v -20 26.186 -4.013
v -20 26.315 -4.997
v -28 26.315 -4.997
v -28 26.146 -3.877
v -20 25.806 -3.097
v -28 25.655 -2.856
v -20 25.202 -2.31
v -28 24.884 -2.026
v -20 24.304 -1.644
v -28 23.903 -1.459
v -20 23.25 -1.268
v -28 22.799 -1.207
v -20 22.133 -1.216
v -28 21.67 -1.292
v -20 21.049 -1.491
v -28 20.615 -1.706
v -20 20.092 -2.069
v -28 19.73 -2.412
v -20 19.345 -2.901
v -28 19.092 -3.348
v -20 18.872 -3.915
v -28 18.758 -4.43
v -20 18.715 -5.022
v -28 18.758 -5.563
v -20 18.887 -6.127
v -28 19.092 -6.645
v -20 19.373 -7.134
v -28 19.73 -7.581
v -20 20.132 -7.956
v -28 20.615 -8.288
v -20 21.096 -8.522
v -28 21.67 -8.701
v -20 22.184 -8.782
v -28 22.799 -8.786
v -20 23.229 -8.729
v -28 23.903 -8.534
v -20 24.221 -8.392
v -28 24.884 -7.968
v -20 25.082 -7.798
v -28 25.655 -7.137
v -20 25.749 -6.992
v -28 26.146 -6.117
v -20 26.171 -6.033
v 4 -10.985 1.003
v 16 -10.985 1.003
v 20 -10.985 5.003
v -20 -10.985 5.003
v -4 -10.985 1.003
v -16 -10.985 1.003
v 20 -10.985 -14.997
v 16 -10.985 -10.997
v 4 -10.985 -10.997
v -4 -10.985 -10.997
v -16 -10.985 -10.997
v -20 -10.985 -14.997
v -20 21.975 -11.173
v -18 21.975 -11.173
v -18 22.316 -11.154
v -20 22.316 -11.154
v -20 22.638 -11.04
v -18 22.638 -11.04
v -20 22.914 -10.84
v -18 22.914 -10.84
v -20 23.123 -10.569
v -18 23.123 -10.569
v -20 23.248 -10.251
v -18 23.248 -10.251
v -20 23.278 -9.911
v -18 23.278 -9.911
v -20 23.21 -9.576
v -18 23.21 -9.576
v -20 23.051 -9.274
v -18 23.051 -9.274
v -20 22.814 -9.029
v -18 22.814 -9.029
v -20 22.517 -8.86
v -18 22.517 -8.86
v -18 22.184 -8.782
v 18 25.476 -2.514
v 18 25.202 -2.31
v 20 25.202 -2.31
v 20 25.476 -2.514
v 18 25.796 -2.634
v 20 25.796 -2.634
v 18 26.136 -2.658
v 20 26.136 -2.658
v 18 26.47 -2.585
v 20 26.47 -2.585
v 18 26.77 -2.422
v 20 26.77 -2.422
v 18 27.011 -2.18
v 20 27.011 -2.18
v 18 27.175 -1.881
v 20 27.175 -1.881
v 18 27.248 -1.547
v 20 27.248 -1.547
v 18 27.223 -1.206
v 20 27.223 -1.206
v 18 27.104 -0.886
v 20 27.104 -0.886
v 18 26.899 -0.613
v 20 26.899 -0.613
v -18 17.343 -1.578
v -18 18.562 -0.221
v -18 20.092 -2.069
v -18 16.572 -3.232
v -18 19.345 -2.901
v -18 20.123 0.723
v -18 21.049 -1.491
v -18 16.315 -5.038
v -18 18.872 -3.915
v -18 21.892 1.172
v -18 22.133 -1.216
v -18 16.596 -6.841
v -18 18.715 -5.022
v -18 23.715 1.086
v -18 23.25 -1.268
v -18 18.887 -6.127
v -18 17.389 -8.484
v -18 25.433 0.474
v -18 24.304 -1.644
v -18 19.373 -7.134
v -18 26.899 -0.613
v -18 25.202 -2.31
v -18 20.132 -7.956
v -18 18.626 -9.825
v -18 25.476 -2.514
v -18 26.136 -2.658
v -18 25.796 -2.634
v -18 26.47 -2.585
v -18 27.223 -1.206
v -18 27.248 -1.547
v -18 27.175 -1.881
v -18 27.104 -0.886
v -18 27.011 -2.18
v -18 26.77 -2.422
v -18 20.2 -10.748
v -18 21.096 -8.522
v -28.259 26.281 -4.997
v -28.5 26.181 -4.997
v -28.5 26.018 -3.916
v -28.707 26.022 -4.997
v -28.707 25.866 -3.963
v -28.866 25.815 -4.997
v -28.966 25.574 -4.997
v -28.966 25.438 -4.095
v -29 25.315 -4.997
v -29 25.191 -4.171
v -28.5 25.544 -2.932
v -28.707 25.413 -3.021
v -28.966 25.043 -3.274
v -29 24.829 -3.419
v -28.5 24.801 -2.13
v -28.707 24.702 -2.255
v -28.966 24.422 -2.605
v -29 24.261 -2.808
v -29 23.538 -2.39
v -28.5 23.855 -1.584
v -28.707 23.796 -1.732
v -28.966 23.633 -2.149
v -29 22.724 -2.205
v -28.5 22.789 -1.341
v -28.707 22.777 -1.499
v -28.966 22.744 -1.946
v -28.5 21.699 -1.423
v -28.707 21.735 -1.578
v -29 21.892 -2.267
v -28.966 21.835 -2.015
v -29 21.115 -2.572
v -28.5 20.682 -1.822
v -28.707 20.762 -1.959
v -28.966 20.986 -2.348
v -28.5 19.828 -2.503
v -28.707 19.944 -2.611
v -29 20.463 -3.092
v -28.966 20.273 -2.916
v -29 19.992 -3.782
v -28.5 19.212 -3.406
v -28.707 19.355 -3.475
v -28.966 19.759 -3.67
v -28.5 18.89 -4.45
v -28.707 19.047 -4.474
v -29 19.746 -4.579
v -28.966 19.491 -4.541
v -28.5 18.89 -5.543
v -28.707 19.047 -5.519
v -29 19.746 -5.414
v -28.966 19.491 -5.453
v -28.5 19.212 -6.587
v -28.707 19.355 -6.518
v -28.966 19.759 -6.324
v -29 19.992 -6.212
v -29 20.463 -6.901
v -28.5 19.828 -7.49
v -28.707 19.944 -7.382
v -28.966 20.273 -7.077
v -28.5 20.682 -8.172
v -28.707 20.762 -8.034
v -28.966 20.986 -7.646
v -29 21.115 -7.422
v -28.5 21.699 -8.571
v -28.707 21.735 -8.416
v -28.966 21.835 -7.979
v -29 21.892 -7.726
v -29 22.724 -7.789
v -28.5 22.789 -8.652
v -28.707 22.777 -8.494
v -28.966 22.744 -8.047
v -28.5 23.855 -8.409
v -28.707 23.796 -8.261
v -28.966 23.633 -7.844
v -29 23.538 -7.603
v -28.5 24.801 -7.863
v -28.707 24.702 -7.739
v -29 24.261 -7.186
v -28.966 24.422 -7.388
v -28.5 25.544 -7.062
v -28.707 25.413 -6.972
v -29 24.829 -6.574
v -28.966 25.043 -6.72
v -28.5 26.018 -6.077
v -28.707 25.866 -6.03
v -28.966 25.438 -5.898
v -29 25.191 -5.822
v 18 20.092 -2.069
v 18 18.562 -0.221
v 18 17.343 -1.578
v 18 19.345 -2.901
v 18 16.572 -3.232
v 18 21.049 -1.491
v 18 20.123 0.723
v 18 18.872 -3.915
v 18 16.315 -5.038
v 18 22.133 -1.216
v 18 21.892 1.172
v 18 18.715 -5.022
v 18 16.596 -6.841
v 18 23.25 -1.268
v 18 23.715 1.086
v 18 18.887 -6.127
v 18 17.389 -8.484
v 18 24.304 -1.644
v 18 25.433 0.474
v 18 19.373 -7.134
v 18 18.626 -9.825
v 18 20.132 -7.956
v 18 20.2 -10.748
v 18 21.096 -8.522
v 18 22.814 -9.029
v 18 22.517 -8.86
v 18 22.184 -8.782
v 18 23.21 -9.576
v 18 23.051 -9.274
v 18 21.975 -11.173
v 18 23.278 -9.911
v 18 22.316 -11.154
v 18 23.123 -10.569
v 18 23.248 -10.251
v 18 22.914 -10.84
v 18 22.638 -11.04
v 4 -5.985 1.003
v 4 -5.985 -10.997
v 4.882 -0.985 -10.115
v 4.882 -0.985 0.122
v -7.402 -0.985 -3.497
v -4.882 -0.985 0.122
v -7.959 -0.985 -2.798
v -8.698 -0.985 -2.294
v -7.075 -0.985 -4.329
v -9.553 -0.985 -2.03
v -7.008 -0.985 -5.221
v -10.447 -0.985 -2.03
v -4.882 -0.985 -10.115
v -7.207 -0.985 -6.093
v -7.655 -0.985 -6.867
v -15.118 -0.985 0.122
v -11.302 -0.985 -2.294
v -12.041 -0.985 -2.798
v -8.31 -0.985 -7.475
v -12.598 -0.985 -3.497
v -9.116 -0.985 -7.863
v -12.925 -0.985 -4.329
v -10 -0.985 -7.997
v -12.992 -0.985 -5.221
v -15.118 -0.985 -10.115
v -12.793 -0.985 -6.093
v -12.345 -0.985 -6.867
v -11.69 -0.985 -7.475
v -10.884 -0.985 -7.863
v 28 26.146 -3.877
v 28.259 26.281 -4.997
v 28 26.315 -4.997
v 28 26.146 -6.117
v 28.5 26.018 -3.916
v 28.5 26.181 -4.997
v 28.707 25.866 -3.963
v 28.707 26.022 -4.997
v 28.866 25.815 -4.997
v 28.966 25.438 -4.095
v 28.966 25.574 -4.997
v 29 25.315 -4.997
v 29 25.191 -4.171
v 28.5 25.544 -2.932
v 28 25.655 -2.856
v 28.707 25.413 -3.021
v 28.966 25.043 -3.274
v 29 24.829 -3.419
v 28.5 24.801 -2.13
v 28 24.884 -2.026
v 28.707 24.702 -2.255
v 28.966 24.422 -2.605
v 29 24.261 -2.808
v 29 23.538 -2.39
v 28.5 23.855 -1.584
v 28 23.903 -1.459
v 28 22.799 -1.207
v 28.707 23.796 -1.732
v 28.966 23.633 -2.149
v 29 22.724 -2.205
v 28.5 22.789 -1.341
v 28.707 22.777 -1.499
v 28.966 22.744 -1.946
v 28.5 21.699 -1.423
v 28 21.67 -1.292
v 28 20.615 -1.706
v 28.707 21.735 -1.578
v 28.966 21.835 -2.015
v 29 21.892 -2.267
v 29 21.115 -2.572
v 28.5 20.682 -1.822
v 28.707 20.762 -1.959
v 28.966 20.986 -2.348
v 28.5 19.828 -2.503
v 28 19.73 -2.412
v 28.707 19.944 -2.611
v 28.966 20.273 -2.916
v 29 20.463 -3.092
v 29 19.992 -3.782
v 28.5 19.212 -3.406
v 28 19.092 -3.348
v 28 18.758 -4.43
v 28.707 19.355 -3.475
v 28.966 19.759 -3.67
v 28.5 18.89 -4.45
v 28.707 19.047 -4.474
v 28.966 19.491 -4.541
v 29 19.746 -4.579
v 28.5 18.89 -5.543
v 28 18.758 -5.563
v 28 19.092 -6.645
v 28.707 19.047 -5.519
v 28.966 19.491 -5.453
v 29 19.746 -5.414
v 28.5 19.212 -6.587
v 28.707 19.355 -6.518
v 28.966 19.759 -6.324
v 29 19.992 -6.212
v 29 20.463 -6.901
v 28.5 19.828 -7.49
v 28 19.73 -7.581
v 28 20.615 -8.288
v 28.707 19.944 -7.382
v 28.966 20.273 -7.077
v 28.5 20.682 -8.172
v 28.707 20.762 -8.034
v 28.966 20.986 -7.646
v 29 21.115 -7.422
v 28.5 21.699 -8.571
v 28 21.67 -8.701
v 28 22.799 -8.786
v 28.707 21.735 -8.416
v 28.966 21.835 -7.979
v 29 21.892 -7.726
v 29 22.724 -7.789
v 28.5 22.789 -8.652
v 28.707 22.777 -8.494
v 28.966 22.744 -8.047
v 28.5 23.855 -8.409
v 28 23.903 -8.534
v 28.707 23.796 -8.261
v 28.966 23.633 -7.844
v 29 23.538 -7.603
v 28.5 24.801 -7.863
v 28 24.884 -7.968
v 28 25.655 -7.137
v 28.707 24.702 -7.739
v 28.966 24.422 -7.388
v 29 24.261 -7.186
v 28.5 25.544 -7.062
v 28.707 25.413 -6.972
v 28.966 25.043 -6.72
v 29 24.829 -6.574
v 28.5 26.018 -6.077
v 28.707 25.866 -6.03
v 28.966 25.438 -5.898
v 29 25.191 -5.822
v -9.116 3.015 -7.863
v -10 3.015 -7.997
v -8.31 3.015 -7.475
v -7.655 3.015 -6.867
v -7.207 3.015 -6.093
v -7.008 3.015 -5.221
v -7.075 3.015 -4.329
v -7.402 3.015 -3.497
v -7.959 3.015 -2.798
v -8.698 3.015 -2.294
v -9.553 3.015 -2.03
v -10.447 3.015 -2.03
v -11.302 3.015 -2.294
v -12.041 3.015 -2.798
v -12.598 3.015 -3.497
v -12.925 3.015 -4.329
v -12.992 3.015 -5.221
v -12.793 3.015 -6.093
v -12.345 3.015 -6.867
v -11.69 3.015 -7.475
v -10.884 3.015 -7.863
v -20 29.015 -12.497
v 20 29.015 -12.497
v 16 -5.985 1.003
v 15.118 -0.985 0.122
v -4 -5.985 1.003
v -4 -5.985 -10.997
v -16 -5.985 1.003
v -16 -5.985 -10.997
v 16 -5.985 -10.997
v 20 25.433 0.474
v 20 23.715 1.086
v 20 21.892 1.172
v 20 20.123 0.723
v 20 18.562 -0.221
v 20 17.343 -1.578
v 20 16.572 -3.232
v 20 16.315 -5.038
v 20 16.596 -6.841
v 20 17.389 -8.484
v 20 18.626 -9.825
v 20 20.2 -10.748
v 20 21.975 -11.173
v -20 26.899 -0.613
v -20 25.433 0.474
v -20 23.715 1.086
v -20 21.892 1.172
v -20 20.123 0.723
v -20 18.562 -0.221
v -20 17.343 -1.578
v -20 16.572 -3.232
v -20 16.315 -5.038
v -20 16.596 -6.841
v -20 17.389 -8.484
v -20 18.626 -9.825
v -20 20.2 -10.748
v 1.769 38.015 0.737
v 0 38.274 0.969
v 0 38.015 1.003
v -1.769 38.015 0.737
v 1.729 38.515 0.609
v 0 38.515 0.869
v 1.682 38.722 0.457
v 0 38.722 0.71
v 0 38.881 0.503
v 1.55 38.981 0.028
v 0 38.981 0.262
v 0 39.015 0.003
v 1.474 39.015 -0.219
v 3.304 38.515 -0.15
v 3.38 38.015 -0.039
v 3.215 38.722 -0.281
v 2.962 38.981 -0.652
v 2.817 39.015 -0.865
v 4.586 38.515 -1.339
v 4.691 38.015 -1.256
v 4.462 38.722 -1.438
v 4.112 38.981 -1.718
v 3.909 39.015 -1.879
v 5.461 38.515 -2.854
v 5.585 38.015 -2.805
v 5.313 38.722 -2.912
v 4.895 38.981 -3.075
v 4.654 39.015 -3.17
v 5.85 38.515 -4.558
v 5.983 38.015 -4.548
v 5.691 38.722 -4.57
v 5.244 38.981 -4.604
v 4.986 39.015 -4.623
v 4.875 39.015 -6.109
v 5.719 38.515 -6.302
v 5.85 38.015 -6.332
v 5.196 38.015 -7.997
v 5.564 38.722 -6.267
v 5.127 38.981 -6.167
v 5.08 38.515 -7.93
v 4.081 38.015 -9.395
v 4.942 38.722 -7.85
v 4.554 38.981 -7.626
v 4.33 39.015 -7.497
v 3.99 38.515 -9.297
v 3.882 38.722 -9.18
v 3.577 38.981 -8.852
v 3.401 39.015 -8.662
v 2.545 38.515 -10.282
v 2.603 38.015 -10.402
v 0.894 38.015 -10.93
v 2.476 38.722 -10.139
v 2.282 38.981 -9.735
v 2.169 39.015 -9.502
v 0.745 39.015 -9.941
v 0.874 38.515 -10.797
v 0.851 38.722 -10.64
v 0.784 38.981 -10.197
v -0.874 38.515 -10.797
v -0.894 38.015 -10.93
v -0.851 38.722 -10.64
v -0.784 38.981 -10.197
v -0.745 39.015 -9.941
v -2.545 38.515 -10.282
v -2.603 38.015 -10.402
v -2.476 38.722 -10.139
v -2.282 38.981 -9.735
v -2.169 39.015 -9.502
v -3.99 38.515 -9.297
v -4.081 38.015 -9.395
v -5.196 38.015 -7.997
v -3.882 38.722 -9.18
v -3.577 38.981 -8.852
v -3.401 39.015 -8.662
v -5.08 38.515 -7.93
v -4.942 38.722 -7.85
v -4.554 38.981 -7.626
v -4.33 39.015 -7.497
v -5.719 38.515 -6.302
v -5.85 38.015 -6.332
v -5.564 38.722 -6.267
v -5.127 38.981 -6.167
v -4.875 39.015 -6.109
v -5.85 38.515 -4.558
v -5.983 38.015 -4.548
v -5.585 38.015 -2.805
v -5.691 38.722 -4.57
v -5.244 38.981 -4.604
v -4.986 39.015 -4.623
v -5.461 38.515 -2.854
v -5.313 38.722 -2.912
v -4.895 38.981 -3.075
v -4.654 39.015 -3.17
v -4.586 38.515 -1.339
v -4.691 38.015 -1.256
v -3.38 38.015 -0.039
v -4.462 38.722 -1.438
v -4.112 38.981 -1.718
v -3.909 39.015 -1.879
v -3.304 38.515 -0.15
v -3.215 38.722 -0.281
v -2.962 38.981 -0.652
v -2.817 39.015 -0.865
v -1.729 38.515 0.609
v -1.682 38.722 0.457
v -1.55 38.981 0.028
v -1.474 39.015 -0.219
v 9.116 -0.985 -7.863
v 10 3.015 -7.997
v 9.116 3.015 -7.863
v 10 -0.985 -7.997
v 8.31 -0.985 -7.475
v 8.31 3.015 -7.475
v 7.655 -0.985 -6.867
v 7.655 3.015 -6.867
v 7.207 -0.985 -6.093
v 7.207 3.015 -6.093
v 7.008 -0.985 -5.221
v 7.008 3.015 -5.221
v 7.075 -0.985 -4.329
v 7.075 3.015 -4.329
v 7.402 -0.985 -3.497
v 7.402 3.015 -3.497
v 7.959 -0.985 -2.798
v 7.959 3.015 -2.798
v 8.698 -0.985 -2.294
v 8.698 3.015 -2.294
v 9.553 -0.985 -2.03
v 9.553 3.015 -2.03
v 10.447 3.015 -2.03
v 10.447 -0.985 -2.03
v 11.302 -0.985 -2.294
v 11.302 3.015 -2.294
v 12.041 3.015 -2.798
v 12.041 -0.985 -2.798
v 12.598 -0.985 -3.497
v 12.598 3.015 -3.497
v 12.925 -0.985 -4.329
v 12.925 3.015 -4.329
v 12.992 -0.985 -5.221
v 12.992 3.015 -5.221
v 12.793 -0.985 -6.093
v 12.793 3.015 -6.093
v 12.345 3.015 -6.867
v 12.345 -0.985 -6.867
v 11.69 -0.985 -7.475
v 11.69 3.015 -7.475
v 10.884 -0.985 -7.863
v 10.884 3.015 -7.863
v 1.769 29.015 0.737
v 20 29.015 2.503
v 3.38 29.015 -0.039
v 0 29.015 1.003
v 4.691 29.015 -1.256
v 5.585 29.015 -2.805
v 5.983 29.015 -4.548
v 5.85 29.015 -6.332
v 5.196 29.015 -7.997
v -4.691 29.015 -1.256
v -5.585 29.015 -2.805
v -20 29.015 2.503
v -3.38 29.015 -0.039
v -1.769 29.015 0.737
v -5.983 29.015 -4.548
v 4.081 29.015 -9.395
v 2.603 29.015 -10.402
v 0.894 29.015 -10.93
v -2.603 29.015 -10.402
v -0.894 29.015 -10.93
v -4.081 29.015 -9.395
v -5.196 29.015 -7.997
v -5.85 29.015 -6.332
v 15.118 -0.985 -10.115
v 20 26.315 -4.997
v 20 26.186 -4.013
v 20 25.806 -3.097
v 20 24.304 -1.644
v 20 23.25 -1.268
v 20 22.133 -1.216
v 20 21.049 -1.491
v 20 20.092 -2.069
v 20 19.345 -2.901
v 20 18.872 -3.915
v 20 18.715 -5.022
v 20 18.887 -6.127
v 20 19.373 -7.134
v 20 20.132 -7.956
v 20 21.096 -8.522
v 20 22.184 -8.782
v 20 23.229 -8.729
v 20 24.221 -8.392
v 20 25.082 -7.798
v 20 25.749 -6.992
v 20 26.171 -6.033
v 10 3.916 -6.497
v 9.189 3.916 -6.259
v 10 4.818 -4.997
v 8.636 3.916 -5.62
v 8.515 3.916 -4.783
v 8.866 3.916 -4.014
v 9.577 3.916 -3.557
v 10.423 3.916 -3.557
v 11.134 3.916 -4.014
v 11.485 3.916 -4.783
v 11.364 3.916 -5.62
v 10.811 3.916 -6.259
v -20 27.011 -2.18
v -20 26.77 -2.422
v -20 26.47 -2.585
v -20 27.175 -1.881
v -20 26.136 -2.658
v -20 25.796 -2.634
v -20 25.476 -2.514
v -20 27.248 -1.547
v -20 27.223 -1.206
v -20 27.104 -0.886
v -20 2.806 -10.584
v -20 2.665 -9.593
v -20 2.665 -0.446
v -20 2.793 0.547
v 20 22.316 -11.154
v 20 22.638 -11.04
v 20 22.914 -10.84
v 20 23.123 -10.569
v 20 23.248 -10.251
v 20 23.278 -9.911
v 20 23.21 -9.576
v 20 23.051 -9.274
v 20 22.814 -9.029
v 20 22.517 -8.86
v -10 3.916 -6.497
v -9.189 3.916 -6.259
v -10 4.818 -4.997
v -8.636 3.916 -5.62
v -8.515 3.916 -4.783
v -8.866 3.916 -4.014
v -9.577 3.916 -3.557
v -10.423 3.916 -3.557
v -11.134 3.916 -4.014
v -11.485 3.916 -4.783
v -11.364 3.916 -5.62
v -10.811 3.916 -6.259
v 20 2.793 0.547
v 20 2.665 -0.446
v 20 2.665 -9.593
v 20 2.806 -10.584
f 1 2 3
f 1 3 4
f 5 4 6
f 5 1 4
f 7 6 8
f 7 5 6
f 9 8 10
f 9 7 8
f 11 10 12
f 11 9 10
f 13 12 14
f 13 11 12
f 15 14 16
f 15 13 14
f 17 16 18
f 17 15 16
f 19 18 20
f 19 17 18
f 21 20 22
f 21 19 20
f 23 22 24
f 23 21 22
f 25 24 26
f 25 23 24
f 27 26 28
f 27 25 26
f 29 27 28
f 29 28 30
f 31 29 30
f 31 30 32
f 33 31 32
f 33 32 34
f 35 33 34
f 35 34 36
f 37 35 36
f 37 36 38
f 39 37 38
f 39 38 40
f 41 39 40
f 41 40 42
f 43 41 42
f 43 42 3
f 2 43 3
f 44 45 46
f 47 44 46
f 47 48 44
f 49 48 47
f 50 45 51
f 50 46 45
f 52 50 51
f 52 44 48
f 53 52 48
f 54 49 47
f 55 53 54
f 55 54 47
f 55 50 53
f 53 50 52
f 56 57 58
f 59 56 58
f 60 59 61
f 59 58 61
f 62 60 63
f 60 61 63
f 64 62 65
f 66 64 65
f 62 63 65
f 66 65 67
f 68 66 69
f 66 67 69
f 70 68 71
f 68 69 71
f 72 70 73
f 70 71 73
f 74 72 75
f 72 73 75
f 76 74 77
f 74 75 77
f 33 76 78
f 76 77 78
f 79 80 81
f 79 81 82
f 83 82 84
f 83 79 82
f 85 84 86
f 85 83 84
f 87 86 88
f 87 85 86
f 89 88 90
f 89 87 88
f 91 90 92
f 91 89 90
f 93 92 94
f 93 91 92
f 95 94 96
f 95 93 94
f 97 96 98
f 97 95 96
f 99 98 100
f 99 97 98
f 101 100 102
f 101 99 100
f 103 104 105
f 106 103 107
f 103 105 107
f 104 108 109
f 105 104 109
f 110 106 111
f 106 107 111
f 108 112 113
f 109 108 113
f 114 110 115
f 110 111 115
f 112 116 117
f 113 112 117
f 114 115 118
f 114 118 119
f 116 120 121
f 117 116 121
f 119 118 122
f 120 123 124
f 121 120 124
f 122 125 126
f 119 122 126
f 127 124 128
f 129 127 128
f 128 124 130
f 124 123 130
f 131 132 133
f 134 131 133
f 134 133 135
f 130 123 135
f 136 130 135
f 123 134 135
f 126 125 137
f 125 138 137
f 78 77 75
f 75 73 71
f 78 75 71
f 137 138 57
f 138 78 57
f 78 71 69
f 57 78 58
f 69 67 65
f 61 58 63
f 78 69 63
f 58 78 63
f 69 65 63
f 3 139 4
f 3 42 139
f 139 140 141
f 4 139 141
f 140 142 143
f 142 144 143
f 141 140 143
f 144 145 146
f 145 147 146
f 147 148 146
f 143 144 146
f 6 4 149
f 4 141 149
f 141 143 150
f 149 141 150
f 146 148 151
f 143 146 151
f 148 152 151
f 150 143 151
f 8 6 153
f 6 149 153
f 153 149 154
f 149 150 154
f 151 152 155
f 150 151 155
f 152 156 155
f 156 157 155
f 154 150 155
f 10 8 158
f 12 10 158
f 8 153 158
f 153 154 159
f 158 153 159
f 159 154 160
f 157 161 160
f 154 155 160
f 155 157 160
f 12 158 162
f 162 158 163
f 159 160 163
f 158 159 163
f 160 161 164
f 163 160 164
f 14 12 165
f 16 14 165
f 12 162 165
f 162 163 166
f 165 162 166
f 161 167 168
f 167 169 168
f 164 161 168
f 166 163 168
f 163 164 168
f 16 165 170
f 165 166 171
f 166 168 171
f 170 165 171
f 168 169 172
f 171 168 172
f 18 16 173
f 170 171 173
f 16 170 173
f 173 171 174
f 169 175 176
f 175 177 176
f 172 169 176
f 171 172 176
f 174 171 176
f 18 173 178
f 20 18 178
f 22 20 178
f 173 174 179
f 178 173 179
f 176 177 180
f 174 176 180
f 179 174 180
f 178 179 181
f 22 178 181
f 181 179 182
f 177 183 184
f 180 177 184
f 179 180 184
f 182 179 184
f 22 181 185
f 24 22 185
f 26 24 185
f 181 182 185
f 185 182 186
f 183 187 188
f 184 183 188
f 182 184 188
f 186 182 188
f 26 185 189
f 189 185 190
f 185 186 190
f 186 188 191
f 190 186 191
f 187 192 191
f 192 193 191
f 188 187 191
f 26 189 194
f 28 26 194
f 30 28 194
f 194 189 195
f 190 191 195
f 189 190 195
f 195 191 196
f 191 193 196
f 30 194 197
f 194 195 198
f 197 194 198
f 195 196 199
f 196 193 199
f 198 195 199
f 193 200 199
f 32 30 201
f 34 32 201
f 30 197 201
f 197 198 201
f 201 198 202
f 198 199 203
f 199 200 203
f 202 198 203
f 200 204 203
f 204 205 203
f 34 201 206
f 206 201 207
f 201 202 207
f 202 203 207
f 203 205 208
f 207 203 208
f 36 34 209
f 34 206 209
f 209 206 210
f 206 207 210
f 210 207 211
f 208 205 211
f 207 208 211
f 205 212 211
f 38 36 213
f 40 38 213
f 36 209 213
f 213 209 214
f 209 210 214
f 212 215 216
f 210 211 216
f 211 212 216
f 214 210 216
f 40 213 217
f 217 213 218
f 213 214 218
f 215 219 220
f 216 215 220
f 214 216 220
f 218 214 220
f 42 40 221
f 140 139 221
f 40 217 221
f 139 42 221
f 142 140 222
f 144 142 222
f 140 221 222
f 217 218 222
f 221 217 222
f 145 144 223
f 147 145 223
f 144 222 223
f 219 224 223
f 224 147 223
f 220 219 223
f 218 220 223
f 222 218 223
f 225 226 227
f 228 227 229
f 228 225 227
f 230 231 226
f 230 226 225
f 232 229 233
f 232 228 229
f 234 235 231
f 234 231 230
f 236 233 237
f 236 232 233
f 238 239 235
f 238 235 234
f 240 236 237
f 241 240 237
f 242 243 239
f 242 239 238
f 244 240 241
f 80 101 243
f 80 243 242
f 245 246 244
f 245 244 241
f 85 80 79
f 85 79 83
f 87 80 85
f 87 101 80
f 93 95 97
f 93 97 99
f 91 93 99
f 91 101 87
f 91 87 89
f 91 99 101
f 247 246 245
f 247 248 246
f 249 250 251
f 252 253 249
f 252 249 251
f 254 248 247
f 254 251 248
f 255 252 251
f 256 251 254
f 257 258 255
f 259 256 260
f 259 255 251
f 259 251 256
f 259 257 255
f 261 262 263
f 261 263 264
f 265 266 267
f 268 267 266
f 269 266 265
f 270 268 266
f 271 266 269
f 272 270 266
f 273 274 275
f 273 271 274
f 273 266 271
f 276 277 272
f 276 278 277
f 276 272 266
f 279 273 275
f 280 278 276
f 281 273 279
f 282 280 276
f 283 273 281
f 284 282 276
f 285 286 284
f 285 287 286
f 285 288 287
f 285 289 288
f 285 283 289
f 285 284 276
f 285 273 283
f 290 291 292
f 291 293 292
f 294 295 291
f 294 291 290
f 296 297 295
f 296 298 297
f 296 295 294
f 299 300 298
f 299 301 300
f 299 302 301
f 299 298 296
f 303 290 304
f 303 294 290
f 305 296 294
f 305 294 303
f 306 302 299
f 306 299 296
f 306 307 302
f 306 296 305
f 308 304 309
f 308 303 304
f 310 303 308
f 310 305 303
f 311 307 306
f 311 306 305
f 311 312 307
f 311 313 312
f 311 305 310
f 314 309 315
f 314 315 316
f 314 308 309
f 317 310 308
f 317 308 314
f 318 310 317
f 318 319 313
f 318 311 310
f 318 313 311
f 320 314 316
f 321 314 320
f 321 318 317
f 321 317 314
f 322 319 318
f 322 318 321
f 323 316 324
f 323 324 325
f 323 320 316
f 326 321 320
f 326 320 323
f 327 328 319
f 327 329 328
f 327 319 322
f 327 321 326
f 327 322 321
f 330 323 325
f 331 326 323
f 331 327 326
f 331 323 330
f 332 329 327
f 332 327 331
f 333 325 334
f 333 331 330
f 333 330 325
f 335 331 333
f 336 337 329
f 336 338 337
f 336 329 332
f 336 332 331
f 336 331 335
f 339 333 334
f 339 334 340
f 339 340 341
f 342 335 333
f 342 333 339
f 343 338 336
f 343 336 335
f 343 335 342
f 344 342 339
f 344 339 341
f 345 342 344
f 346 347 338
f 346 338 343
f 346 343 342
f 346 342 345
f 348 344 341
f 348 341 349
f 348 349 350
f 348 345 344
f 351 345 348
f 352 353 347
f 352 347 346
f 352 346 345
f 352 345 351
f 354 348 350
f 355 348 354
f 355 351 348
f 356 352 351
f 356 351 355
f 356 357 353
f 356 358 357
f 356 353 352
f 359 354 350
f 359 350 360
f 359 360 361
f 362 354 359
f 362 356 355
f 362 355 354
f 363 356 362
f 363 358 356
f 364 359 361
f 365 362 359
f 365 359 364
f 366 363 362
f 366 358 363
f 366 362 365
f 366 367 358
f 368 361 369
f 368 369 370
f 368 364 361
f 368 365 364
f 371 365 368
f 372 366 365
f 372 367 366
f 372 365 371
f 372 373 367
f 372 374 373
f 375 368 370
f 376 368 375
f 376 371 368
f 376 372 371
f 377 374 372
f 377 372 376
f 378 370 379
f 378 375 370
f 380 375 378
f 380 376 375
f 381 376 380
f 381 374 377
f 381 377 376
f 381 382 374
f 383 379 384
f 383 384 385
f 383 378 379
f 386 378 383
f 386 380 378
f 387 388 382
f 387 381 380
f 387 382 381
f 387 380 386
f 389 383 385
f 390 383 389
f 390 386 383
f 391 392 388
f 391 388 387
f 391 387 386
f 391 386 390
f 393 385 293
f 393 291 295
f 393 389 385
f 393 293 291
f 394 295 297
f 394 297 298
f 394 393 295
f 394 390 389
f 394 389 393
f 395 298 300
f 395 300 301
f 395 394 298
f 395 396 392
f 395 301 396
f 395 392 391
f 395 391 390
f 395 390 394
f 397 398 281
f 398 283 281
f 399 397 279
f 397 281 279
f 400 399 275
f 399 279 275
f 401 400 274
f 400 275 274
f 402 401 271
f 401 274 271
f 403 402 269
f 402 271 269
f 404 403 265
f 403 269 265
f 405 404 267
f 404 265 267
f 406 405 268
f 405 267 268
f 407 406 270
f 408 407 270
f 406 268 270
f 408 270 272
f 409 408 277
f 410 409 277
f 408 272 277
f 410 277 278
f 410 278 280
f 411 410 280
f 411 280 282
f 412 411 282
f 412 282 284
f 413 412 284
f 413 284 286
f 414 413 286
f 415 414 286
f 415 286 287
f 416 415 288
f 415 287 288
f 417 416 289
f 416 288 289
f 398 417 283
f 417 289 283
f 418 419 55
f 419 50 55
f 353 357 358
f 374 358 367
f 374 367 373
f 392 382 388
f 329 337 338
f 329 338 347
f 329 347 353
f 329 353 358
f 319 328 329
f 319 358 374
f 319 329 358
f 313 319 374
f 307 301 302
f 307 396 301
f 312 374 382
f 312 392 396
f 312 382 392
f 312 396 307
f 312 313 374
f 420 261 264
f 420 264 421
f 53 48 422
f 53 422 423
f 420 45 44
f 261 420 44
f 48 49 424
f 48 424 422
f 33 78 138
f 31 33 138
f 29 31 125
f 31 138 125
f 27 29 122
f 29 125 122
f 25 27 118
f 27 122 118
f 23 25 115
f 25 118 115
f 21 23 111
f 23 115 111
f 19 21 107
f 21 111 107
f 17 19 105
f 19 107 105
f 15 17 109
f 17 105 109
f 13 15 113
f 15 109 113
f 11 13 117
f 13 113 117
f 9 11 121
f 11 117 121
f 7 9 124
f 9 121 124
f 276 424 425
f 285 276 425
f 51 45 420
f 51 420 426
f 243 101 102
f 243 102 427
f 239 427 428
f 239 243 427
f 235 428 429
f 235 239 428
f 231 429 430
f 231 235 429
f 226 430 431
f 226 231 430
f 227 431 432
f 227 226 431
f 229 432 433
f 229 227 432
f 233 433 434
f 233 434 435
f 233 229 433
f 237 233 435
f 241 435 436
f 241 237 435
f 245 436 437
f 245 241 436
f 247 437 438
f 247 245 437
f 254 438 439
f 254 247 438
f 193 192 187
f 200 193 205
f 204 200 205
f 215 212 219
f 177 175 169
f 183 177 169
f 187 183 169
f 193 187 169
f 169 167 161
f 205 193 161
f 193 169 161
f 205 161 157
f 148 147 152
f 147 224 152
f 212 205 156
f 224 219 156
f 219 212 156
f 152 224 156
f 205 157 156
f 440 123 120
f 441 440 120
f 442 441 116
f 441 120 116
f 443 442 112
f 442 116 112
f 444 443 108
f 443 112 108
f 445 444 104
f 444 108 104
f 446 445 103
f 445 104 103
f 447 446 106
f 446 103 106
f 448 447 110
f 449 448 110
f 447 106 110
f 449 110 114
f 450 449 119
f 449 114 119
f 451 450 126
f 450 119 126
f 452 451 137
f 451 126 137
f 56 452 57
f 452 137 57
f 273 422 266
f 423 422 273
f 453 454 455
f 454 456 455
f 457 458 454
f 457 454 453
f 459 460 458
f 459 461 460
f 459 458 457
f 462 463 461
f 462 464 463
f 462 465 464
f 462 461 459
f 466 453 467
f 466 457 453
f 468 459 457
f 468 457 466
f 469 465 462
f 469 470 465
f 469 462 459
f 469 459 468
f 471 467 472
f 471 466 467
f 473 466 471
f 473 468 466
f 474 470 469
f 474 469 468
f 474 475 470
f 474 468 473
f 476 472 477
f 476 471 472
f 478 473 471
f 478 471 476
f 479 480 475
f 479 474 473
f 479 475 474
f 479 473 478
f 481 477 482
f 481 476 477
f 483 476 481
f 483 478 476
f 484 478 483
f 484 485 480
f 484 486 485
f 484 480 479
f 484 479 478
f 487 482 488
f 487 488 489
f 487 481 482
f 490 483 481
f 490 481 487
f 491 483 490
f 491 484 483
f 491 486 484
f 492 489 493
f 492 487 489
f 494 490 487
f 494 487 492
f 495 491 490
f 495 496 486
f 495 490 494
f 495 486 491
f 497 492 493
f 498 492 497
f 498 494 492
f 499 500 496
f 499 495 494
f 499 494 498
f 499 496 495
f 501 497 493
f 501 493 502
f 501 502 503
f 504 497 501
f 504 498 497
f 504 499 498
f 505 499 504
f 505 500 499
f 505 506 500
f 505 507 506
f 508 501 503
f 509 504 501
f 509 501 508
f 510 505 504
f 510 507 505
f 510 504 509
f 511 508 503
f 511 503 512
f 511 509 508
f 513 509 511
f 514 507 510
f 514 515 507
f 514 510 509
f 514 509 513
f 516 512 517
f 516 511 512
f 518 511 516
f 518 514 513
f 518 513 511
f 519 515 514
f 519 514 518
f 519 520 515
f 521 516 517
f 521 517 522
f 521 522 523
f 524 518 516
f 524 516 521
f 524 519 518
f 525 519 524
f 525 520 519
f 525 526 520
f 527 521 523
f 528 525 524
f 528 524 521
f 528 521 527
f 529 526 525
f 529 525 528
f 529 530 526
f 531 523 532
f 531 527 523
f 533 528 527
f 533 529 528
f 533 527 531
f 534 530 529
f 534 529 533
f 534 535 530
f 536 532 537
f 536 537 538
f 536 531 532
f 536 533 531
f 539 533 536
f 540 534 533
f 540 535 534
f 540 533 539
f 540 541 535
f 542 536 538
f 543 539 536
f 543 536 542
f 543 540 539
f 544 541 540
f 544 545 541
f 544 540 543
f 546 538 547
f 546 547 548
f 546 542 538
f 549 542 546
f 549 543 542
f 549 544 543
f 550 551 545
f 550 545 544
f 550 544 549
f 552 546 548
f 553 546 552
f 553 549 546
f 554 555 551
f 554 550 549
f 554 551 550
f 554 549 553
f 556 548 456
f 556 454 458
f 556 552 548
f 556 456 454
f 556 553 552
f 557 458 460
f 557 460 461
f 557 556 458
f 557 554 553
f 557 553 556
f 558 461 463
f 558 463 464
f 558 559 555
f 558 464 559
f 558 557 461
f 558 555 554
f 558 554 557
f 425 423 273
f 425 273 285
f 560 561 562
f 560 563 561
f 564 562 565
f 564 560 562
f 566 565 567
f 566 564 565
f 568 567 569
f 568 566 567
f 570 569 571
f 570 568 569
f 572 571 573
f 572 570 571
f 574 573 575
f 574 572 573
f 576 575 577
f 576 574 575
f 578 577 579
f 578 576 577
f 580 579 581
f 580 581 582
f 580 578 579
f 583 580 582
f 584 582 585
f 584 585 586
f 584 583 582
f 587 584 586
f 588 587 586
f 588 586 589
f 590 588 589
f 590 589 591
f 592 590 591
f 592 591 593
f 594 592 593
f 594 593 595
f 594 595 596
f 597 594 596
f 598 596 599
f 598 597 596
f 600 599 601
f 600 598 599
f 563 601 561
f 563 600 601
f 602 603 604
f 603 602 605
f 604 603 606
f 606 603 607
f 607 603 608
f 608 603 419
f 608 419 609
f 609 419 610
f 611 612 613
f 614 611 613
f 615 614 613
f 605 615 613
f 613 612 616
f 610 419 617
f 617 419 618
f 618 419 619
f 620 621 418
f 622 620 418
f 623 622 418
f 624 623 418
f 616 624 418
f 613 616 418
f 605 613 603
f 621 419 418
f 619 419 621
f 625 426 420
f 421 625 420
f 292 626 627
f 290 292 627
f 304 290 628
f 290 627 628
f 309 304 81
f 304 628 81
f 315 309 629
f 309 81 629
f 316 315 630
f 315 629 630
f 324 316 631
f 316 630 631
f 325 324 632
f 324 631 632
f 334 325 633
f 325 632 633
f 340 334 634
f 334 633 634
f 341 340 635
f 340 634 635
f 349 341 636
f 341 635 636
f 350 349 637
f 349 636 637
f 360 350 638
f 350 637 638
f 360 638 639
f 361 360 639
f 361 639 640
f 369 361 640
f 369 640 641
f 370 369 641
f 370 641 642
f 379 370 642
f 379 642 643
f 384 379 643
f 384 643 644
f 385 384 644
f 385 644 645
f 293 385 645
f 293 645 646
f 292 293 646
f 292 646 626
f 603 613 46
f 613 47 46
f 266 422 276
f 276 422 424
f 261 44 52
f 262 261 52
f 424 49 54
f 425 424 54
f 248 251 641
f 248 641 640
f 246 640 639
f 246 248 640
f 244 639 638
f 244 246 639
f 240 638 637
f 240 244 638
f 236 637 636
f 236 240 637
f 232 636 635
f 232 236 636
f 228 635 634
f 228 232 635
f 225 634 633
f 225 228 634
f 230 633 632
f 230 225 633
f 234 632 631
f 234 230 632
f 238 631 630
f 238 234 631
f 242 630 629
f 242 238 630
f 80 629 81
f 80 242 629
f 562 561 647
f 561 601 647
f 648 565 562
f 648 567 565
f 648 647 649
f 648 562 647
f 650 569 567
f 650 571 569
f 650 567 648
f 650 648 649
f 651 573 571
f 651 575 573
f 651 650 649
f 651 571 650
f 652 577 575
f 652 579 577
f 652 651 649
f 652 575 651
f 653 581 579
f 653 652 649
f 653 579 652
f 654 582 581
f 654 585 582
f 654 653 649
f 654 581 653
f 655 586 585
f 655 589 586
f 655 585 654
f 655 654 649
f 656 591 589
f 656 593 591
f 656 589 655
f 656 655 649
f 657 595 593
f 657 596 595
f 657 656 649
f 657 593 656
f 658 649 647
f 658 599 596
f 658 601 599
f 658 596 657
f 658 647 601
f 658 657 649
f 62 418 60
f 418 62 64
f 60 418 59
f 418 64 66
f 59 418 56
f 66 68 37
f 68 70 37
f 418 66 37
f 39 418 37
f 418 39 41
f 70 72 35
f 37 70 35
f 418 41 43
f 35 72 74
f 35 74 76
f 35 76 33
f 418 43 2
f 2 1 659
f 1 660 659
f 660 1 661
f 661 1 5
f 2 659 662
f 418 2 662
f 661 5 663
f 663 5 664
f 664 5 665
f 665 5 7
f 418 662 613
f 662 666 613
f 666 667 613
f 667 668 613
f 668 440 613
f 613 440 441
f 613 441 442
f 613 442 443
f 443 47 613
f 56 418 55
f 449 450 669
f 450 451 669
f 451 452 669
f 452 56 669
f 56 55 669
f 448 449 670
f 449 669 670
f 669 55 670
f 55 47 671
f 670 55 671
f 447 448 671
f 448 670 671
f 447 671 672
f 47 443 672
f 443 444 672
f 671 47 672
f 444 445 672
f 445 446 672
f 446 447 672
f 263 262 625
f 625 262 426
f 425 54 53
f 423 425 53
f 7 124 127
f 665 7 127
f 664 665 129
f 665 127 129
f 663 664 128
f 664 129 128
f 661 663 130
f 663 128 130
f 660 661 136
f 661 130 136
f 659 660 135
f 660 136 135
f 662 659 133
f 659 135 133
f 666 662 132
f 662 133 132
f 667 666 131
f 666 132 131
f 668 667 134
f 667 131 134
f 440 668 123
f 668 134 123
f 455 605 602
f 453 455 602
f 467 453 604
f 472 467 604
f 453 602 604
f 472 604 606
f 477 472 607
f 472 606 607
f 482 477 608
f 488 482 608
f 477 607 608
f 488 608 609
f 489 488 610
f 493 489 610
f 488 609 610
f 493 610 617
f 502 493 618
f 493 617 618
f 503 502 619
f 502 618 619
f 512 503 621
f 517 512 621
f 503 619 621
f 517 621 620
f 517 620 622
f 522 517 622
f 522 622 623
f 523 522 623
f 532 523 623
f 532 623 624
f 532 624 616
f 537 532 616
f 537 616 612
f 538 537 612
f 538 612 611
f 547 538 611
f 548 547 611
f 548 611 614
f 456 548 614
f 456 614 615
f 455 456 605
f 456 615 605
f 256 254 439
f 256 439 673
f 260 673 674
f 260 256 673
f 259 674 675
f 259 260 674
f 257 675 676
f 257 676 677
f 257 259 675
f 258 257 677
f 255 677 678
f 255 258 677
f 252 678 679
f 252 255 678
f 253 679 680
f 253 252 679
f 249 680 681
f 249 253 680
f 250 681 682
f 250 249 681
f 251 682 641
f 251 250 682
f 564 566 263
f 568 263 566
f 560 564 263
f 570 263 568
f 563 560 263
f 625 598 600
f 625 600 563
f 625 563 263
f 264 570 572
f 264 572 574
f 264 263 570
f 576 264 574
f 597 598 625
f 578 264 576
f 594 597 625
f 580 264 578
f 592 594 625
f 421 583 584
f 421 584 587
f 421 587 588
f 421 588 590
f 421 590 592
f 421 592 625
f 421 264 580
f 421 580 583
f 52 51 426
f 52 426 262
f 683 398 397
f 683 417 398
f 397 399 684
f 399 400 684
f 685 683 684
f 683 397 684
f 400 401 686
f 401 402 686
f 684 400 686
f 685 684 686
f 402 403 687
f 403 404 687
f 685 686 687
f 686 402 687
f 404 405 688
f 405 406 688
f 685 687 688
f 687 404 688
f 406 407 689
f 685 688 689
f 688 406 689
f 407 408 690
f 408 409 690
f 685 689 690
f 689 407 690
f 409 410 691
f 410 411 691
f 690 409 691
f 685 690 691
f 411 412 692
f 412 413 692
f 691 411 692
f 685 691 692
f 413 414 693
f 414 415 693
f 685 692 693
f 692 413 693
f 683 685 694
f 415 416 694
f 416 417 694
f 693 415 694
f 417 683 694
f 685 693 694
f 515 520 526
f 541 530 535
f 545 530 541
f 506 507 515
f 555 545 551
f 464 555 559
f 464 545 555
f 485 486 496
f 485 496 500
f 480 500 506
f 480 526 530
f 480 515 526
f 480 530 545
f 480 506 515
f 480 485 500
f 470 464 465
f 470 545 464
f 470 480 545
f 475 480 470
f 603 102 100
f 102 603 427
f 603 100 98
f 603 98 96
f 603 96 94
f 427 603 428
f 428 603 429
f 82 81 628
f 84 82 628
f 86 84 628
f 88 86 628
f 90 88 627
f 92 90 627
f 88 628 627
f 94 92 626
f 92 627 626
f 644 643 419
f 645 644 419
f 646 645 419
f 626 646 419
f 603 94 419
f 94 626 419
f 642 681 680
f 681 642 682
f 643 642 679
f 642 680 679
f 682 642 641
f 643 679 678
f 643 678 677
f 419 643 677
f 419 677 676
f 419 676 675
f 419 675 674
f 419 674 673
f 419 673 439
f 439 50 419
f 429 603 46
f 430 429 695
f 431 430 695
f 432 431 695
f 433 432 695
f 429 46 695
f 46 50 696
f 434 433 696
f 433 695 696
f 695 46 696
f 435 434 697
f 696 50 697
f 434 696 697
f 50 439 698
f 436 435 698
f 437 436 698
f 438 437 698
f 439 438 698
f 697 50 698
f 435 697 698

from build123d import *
from build123d.topology import SkipClean

# Parameters (mm, degrees)
SKETCH13_R                                  = 3
HEAD_PIN_DEPTH                              = 5
SKETCH2_W                                   = 6
SKETCH2_H                                   = 6
HIP_HOLE_PART_1_DEPTH                       = 2.5
SKETCH3_W                                   = 6
SKETCH3_H                                   = 6
HIP_HOLE_PART_2_DEPTH                       = 2.5
HIP_HOLE_PART_2_DRAFT                       = -10
SKETCH14_R                                  = 1.9
ARM_PIN_DEPTH                               = 4.5
ARM_START                                   = -1
ARM_POSITION_SLOT_DEPTH                     = 1
EASY_ARM_INSERT_R                           = 0.5
COPYING_OVER_ARM_AND_HIP_CONNECTORS_COPY_W  = 6
COPYING_OVER_ARM_AND_HIP_CONNECTORS_COPY_H  = 6
COPYING_OVER_ARM_AND_HIP_CONNECTORS_2_DEPTH = 2.5
COPYING_OVER_ARM_AND_HIP_CONNECTORS_2_DRAFT = -10
EASY_ARM_INSERT_OF_COPYING_OVER_ARM_AND_R   = 0.5
EASY_HEAD_INSERT_R                          = 0.5
SCALE1_SCALE                                = 2


with BuildPart() as part:
    # 3DSketch1 → Body section 0
    with BuildSketch(Plane(origin=(10, 20, -1.25), x_dir=(-0.9363291775690445, 0, -0.35112344158839165), z_dir=(0, -1, 0))):
        with BuildLine():
            Line((0, 0), (2.633425812, 7.022468832))
            Line((2.633425812, 7.022468832), (21.360009363, 0))
            Line((21.360009363, 0), (18.726583551, -7.022468832))
            Line((18.726583551, -7.022468832), (0, 0))
        make_face()
    # Sketch1 → Body section 1
    with BuildSketch(Plane(origin=(0, 0, 0), x_dir=(1, 0, 0), z_dir=(0, 1, 0))):
        with BuildLine():
            Line((-10, 0), (10, 0))
            Line((10, 0), (10, 10))
            Line((10, 10), (-10, 10))
            Line((-10, 10), (-10, 0))
        make_face()
    loft()

    # Sketch13 → Head pin (add)
    with BuildSketch(Plane(origin=(0, 20, 0), x_dir=(1, 0, 0), z_dir=(0, 1, 0))):
        with Locations(Location((0, 5, 0), (0, 0, 270))):
            Circle(SKETCH13_R)
    extrude(amount=HEAD_PIN_DEPTH)

    # Sketch2 → Hip hole part 1 (cut)
    with BuildSketch(Plane(origin=(0, 0, 0), x_dir=(-1, 0, 0), z_dir=(0, -1, 0))):
        with Locations((-5, 5)):
            Rectangle(SKETCH2_W, SKETCH2_H)
    hip_hole_part_1 = extrude(amount=-HIP_HOLE_PART_1_DEPTH, mode=Mode.SUBTRACT)


with BuildPart() as hip_hole_part_2_tool:
    # Sketch3 → Hip hole part 2 (with draft: the straight prism first)
    with BuildSketch(Plane.XZ.offset(-2.5)):
        with Locations((5, -5)):
            Rectangle(SKETCH3_W, SKETCH3_H)
    extrude(amount=-HIP_HOLE_PART_2_DEPTH)
    # Hip hole part 2: the draft: its side faces are tilted about the plane it starts from
    hip_hole_part_2_sides = [hip_hole_part_2_tool.faces().sort_by_distance(p)[0] for p in [
        (8, 3.75, -5),
        (5, 3.75, -2),
        (2, 3.75, -5),
        (5, 3.75, -8),
    ]]
    draft(hip_hole_part_2_sides, Plane.XZ.offset(-2.5), HIP_HOLE_PART_2_DRAFT)


with BuildPart() as part_1:
    add(part.part)

    # Hip hole part 2: cut by hip_hole_part_2_tool
    add(hip_hole_part_2_tool.part, mode=Mode.SUBTRACT)

    # Sketch18 → Weight reduction/Make it easy to add centerlines (revolve, cut)
    with BuildSketch(Plane(origin=(5, 5, -5), x_dir=(0, 0, -1), z_dir=(1, 0, 0))):
        Polygon((0, 0), (0, 2.901290929), (1.5, 2), (1.5, 0), align=None)
    weight_reduction_make_it_easy_to_add_cen = revolve(axis=Axis((5, -1.35, -5), (0, 1, 0)), mode=Mode.SUBTRACT)

    # Sketch14 → Arm pin (add)
    with BuildSketch(Plane(origin=(10, 0, 0), x_dir=(0, 0, -1), z_dir=(1, 0, 0))):
        with Locations(Location((5, 16.75, 0), (0, 0, 90))):
            Circle(SKETCH14_R)
    arm_pin = extrude(amount=ARM_PIN_DEPTH)

    # Sketch15 → Arm position slot (cut)
    with SkipClean():  # the faces are left unmerged after this step: merging them gives an invalid solid
        with BuildSketch(Plane(origin=(10, 0, 0), x_dir=(0, 0, -1), z_dir=(1, 0, 0)).offset(ARM_START)):
            with BuildLine():
                ThreePointArc((2.807968978, 18.942031022), (3.689883389, 13.94044586), (8.088203564, 16.479817197))
                ThreePointArc((8.088203564, 16.479817197), (7.542780191, 17.129827462), (6.892769926, 16.584404089))
                ThreePointArc((6.892769926, 16.584404089), (4.197025303, 15.028015205), (3.656497116, 18.093502884))
                ThreePointArc((3.656497116, 18.093502884), (3.656497116, 18.942031022), (2.807968978, 18.942031022))
            make_face()
        arm_position_slot = extrude(amount=ARM_POSITION_SLOT_DEPTH, mode=Mode.SUBTRACT)

    # Easy arm insert
    easy_arm_insert_edges = [part_1.edges().sort_by_distance(p)[0] for p in [
        (14.5, 14.85, -5),
    ]]
    fillet(easy_arm_insert_edges, radius=EASY_ARM_INSERT_R)

    # Copying over arm and hip connectors: Hip hole part 1, Weight reduction/Make it easy to add centerlines, Arm pin, Arm position slot across plane
    with SkipClean():  # the faces are left unmerged after this step: merging them gives an invalid solid
        add(hip_hole_part_1.mirror(Plane(origin=(0, 0, 0), x_dir=(0, 0, 1), z_dir=(1, 0, 0))), mode=Mode.SUBTRACT)
        add(weight_reduction_make_it_easy_to_add_cen.mirror(Plane(origin=(0, 0, 0), x_dir=(0, 0, 1), z_dir=(1, 0, 0))), mode=Mode.SUBTRACT)
        add(arm_pin.mirror(Plane(origin=(0, 0, 0), x_dir=(0, 0, 1), z_dir=(1, 0, 0))))
        add(arm_position_slot.mirror(Plane(origin=(0, 0, 0), x_dir=(0, 0, 1), z_dir=(1, 0, 0))), mode=Mode.SUBTRACT)


with BuildPart() as copying_over_arm_and_hip_connectors_2_tool:
    # Copying over arm and hip connectors copy → Copying over arm and hip connectors  2 (with draft: the straight prism first)
    with BuildSketch(Plane(origin=(0, 2.5, 0), x_dir=(-1, 0, 0), z_dir=(0, -1, 0))):
        with Locations((5, 5)):
            Rectangle(COPYING_OVER_ARM_AND_HIP_CONNECTORS_COPY_W, COPYING_OVER_ARM_AND_HIP_CONNECTORS_COPY_H)
    extrude(amount=-COPYING_OVER_ARM_AND_HIP_CONNECTORS_2_DEPTH)
    # Copying over arm and hip connectors  2: the draft: its side faces are tilted about the plane it starts from
    copying_over_arm_and_hip_connectors_2_sides = [copying_over_arm_and_hip_connectors_2_tool.faces().sort_by_distance(p)[0] for p in [
        (-8, 3.75, -5),
        (-5, 3.75, -2),
        (-2, 3.75, -5),
        (-5, 3.75, -8),
    ]]
    draft(copying_over_arm_and_hip_connectors_2_sides, Plane(origin=(0, 2.5, 0), x_dir=(-1, 0, 0), z_dir=(0, -1, 0)), COPYING_OVER_ARM_AND_HIP_CONNECTORS_2_DRAFT)


with BuildPart() as part_2:
    add(part_1.part)

    # Copying over arm and hip connectors  2: cut by copying_over_arm_and_hip_connectors_2_tool
    add(copying_over_arm_and_hip_connectors_2_tool.part, mode=Mode.SUBTRACT)

    # Easy arm insert of Copying over arm and
    easy_arm_insert_of_copying_over_arm_and_edges = [part_2.edges().sort_by_distance(p)[0] for p in [
        (-14.5, 14.85, -5),
    ]]
    fillet(easy_arm_insert_of_copying_over_arm_and_edges, radius=EASY_ARM_INSERT_OF_COPYING_OVER_ARM_AND_R)

    # Easy head insert
    easy_head_insert_edges = [part_2.edges().sort_by_distance(p)[0] for p in [
        (0, 25, -8),
    ]]
    fillet(easy_head_insert_edges, radius=EASY_HEAD_INSERT_R)


with BuildPart() as part_3:
    # Scale1: scaled about (2e-09, 10.984808506, -5.003313796)
    add(part_2.part.scale(SCALE1_SCALE).moved(Location((-2e-09, -10.984808506, 5.003313796))))


solid = part_3.part
